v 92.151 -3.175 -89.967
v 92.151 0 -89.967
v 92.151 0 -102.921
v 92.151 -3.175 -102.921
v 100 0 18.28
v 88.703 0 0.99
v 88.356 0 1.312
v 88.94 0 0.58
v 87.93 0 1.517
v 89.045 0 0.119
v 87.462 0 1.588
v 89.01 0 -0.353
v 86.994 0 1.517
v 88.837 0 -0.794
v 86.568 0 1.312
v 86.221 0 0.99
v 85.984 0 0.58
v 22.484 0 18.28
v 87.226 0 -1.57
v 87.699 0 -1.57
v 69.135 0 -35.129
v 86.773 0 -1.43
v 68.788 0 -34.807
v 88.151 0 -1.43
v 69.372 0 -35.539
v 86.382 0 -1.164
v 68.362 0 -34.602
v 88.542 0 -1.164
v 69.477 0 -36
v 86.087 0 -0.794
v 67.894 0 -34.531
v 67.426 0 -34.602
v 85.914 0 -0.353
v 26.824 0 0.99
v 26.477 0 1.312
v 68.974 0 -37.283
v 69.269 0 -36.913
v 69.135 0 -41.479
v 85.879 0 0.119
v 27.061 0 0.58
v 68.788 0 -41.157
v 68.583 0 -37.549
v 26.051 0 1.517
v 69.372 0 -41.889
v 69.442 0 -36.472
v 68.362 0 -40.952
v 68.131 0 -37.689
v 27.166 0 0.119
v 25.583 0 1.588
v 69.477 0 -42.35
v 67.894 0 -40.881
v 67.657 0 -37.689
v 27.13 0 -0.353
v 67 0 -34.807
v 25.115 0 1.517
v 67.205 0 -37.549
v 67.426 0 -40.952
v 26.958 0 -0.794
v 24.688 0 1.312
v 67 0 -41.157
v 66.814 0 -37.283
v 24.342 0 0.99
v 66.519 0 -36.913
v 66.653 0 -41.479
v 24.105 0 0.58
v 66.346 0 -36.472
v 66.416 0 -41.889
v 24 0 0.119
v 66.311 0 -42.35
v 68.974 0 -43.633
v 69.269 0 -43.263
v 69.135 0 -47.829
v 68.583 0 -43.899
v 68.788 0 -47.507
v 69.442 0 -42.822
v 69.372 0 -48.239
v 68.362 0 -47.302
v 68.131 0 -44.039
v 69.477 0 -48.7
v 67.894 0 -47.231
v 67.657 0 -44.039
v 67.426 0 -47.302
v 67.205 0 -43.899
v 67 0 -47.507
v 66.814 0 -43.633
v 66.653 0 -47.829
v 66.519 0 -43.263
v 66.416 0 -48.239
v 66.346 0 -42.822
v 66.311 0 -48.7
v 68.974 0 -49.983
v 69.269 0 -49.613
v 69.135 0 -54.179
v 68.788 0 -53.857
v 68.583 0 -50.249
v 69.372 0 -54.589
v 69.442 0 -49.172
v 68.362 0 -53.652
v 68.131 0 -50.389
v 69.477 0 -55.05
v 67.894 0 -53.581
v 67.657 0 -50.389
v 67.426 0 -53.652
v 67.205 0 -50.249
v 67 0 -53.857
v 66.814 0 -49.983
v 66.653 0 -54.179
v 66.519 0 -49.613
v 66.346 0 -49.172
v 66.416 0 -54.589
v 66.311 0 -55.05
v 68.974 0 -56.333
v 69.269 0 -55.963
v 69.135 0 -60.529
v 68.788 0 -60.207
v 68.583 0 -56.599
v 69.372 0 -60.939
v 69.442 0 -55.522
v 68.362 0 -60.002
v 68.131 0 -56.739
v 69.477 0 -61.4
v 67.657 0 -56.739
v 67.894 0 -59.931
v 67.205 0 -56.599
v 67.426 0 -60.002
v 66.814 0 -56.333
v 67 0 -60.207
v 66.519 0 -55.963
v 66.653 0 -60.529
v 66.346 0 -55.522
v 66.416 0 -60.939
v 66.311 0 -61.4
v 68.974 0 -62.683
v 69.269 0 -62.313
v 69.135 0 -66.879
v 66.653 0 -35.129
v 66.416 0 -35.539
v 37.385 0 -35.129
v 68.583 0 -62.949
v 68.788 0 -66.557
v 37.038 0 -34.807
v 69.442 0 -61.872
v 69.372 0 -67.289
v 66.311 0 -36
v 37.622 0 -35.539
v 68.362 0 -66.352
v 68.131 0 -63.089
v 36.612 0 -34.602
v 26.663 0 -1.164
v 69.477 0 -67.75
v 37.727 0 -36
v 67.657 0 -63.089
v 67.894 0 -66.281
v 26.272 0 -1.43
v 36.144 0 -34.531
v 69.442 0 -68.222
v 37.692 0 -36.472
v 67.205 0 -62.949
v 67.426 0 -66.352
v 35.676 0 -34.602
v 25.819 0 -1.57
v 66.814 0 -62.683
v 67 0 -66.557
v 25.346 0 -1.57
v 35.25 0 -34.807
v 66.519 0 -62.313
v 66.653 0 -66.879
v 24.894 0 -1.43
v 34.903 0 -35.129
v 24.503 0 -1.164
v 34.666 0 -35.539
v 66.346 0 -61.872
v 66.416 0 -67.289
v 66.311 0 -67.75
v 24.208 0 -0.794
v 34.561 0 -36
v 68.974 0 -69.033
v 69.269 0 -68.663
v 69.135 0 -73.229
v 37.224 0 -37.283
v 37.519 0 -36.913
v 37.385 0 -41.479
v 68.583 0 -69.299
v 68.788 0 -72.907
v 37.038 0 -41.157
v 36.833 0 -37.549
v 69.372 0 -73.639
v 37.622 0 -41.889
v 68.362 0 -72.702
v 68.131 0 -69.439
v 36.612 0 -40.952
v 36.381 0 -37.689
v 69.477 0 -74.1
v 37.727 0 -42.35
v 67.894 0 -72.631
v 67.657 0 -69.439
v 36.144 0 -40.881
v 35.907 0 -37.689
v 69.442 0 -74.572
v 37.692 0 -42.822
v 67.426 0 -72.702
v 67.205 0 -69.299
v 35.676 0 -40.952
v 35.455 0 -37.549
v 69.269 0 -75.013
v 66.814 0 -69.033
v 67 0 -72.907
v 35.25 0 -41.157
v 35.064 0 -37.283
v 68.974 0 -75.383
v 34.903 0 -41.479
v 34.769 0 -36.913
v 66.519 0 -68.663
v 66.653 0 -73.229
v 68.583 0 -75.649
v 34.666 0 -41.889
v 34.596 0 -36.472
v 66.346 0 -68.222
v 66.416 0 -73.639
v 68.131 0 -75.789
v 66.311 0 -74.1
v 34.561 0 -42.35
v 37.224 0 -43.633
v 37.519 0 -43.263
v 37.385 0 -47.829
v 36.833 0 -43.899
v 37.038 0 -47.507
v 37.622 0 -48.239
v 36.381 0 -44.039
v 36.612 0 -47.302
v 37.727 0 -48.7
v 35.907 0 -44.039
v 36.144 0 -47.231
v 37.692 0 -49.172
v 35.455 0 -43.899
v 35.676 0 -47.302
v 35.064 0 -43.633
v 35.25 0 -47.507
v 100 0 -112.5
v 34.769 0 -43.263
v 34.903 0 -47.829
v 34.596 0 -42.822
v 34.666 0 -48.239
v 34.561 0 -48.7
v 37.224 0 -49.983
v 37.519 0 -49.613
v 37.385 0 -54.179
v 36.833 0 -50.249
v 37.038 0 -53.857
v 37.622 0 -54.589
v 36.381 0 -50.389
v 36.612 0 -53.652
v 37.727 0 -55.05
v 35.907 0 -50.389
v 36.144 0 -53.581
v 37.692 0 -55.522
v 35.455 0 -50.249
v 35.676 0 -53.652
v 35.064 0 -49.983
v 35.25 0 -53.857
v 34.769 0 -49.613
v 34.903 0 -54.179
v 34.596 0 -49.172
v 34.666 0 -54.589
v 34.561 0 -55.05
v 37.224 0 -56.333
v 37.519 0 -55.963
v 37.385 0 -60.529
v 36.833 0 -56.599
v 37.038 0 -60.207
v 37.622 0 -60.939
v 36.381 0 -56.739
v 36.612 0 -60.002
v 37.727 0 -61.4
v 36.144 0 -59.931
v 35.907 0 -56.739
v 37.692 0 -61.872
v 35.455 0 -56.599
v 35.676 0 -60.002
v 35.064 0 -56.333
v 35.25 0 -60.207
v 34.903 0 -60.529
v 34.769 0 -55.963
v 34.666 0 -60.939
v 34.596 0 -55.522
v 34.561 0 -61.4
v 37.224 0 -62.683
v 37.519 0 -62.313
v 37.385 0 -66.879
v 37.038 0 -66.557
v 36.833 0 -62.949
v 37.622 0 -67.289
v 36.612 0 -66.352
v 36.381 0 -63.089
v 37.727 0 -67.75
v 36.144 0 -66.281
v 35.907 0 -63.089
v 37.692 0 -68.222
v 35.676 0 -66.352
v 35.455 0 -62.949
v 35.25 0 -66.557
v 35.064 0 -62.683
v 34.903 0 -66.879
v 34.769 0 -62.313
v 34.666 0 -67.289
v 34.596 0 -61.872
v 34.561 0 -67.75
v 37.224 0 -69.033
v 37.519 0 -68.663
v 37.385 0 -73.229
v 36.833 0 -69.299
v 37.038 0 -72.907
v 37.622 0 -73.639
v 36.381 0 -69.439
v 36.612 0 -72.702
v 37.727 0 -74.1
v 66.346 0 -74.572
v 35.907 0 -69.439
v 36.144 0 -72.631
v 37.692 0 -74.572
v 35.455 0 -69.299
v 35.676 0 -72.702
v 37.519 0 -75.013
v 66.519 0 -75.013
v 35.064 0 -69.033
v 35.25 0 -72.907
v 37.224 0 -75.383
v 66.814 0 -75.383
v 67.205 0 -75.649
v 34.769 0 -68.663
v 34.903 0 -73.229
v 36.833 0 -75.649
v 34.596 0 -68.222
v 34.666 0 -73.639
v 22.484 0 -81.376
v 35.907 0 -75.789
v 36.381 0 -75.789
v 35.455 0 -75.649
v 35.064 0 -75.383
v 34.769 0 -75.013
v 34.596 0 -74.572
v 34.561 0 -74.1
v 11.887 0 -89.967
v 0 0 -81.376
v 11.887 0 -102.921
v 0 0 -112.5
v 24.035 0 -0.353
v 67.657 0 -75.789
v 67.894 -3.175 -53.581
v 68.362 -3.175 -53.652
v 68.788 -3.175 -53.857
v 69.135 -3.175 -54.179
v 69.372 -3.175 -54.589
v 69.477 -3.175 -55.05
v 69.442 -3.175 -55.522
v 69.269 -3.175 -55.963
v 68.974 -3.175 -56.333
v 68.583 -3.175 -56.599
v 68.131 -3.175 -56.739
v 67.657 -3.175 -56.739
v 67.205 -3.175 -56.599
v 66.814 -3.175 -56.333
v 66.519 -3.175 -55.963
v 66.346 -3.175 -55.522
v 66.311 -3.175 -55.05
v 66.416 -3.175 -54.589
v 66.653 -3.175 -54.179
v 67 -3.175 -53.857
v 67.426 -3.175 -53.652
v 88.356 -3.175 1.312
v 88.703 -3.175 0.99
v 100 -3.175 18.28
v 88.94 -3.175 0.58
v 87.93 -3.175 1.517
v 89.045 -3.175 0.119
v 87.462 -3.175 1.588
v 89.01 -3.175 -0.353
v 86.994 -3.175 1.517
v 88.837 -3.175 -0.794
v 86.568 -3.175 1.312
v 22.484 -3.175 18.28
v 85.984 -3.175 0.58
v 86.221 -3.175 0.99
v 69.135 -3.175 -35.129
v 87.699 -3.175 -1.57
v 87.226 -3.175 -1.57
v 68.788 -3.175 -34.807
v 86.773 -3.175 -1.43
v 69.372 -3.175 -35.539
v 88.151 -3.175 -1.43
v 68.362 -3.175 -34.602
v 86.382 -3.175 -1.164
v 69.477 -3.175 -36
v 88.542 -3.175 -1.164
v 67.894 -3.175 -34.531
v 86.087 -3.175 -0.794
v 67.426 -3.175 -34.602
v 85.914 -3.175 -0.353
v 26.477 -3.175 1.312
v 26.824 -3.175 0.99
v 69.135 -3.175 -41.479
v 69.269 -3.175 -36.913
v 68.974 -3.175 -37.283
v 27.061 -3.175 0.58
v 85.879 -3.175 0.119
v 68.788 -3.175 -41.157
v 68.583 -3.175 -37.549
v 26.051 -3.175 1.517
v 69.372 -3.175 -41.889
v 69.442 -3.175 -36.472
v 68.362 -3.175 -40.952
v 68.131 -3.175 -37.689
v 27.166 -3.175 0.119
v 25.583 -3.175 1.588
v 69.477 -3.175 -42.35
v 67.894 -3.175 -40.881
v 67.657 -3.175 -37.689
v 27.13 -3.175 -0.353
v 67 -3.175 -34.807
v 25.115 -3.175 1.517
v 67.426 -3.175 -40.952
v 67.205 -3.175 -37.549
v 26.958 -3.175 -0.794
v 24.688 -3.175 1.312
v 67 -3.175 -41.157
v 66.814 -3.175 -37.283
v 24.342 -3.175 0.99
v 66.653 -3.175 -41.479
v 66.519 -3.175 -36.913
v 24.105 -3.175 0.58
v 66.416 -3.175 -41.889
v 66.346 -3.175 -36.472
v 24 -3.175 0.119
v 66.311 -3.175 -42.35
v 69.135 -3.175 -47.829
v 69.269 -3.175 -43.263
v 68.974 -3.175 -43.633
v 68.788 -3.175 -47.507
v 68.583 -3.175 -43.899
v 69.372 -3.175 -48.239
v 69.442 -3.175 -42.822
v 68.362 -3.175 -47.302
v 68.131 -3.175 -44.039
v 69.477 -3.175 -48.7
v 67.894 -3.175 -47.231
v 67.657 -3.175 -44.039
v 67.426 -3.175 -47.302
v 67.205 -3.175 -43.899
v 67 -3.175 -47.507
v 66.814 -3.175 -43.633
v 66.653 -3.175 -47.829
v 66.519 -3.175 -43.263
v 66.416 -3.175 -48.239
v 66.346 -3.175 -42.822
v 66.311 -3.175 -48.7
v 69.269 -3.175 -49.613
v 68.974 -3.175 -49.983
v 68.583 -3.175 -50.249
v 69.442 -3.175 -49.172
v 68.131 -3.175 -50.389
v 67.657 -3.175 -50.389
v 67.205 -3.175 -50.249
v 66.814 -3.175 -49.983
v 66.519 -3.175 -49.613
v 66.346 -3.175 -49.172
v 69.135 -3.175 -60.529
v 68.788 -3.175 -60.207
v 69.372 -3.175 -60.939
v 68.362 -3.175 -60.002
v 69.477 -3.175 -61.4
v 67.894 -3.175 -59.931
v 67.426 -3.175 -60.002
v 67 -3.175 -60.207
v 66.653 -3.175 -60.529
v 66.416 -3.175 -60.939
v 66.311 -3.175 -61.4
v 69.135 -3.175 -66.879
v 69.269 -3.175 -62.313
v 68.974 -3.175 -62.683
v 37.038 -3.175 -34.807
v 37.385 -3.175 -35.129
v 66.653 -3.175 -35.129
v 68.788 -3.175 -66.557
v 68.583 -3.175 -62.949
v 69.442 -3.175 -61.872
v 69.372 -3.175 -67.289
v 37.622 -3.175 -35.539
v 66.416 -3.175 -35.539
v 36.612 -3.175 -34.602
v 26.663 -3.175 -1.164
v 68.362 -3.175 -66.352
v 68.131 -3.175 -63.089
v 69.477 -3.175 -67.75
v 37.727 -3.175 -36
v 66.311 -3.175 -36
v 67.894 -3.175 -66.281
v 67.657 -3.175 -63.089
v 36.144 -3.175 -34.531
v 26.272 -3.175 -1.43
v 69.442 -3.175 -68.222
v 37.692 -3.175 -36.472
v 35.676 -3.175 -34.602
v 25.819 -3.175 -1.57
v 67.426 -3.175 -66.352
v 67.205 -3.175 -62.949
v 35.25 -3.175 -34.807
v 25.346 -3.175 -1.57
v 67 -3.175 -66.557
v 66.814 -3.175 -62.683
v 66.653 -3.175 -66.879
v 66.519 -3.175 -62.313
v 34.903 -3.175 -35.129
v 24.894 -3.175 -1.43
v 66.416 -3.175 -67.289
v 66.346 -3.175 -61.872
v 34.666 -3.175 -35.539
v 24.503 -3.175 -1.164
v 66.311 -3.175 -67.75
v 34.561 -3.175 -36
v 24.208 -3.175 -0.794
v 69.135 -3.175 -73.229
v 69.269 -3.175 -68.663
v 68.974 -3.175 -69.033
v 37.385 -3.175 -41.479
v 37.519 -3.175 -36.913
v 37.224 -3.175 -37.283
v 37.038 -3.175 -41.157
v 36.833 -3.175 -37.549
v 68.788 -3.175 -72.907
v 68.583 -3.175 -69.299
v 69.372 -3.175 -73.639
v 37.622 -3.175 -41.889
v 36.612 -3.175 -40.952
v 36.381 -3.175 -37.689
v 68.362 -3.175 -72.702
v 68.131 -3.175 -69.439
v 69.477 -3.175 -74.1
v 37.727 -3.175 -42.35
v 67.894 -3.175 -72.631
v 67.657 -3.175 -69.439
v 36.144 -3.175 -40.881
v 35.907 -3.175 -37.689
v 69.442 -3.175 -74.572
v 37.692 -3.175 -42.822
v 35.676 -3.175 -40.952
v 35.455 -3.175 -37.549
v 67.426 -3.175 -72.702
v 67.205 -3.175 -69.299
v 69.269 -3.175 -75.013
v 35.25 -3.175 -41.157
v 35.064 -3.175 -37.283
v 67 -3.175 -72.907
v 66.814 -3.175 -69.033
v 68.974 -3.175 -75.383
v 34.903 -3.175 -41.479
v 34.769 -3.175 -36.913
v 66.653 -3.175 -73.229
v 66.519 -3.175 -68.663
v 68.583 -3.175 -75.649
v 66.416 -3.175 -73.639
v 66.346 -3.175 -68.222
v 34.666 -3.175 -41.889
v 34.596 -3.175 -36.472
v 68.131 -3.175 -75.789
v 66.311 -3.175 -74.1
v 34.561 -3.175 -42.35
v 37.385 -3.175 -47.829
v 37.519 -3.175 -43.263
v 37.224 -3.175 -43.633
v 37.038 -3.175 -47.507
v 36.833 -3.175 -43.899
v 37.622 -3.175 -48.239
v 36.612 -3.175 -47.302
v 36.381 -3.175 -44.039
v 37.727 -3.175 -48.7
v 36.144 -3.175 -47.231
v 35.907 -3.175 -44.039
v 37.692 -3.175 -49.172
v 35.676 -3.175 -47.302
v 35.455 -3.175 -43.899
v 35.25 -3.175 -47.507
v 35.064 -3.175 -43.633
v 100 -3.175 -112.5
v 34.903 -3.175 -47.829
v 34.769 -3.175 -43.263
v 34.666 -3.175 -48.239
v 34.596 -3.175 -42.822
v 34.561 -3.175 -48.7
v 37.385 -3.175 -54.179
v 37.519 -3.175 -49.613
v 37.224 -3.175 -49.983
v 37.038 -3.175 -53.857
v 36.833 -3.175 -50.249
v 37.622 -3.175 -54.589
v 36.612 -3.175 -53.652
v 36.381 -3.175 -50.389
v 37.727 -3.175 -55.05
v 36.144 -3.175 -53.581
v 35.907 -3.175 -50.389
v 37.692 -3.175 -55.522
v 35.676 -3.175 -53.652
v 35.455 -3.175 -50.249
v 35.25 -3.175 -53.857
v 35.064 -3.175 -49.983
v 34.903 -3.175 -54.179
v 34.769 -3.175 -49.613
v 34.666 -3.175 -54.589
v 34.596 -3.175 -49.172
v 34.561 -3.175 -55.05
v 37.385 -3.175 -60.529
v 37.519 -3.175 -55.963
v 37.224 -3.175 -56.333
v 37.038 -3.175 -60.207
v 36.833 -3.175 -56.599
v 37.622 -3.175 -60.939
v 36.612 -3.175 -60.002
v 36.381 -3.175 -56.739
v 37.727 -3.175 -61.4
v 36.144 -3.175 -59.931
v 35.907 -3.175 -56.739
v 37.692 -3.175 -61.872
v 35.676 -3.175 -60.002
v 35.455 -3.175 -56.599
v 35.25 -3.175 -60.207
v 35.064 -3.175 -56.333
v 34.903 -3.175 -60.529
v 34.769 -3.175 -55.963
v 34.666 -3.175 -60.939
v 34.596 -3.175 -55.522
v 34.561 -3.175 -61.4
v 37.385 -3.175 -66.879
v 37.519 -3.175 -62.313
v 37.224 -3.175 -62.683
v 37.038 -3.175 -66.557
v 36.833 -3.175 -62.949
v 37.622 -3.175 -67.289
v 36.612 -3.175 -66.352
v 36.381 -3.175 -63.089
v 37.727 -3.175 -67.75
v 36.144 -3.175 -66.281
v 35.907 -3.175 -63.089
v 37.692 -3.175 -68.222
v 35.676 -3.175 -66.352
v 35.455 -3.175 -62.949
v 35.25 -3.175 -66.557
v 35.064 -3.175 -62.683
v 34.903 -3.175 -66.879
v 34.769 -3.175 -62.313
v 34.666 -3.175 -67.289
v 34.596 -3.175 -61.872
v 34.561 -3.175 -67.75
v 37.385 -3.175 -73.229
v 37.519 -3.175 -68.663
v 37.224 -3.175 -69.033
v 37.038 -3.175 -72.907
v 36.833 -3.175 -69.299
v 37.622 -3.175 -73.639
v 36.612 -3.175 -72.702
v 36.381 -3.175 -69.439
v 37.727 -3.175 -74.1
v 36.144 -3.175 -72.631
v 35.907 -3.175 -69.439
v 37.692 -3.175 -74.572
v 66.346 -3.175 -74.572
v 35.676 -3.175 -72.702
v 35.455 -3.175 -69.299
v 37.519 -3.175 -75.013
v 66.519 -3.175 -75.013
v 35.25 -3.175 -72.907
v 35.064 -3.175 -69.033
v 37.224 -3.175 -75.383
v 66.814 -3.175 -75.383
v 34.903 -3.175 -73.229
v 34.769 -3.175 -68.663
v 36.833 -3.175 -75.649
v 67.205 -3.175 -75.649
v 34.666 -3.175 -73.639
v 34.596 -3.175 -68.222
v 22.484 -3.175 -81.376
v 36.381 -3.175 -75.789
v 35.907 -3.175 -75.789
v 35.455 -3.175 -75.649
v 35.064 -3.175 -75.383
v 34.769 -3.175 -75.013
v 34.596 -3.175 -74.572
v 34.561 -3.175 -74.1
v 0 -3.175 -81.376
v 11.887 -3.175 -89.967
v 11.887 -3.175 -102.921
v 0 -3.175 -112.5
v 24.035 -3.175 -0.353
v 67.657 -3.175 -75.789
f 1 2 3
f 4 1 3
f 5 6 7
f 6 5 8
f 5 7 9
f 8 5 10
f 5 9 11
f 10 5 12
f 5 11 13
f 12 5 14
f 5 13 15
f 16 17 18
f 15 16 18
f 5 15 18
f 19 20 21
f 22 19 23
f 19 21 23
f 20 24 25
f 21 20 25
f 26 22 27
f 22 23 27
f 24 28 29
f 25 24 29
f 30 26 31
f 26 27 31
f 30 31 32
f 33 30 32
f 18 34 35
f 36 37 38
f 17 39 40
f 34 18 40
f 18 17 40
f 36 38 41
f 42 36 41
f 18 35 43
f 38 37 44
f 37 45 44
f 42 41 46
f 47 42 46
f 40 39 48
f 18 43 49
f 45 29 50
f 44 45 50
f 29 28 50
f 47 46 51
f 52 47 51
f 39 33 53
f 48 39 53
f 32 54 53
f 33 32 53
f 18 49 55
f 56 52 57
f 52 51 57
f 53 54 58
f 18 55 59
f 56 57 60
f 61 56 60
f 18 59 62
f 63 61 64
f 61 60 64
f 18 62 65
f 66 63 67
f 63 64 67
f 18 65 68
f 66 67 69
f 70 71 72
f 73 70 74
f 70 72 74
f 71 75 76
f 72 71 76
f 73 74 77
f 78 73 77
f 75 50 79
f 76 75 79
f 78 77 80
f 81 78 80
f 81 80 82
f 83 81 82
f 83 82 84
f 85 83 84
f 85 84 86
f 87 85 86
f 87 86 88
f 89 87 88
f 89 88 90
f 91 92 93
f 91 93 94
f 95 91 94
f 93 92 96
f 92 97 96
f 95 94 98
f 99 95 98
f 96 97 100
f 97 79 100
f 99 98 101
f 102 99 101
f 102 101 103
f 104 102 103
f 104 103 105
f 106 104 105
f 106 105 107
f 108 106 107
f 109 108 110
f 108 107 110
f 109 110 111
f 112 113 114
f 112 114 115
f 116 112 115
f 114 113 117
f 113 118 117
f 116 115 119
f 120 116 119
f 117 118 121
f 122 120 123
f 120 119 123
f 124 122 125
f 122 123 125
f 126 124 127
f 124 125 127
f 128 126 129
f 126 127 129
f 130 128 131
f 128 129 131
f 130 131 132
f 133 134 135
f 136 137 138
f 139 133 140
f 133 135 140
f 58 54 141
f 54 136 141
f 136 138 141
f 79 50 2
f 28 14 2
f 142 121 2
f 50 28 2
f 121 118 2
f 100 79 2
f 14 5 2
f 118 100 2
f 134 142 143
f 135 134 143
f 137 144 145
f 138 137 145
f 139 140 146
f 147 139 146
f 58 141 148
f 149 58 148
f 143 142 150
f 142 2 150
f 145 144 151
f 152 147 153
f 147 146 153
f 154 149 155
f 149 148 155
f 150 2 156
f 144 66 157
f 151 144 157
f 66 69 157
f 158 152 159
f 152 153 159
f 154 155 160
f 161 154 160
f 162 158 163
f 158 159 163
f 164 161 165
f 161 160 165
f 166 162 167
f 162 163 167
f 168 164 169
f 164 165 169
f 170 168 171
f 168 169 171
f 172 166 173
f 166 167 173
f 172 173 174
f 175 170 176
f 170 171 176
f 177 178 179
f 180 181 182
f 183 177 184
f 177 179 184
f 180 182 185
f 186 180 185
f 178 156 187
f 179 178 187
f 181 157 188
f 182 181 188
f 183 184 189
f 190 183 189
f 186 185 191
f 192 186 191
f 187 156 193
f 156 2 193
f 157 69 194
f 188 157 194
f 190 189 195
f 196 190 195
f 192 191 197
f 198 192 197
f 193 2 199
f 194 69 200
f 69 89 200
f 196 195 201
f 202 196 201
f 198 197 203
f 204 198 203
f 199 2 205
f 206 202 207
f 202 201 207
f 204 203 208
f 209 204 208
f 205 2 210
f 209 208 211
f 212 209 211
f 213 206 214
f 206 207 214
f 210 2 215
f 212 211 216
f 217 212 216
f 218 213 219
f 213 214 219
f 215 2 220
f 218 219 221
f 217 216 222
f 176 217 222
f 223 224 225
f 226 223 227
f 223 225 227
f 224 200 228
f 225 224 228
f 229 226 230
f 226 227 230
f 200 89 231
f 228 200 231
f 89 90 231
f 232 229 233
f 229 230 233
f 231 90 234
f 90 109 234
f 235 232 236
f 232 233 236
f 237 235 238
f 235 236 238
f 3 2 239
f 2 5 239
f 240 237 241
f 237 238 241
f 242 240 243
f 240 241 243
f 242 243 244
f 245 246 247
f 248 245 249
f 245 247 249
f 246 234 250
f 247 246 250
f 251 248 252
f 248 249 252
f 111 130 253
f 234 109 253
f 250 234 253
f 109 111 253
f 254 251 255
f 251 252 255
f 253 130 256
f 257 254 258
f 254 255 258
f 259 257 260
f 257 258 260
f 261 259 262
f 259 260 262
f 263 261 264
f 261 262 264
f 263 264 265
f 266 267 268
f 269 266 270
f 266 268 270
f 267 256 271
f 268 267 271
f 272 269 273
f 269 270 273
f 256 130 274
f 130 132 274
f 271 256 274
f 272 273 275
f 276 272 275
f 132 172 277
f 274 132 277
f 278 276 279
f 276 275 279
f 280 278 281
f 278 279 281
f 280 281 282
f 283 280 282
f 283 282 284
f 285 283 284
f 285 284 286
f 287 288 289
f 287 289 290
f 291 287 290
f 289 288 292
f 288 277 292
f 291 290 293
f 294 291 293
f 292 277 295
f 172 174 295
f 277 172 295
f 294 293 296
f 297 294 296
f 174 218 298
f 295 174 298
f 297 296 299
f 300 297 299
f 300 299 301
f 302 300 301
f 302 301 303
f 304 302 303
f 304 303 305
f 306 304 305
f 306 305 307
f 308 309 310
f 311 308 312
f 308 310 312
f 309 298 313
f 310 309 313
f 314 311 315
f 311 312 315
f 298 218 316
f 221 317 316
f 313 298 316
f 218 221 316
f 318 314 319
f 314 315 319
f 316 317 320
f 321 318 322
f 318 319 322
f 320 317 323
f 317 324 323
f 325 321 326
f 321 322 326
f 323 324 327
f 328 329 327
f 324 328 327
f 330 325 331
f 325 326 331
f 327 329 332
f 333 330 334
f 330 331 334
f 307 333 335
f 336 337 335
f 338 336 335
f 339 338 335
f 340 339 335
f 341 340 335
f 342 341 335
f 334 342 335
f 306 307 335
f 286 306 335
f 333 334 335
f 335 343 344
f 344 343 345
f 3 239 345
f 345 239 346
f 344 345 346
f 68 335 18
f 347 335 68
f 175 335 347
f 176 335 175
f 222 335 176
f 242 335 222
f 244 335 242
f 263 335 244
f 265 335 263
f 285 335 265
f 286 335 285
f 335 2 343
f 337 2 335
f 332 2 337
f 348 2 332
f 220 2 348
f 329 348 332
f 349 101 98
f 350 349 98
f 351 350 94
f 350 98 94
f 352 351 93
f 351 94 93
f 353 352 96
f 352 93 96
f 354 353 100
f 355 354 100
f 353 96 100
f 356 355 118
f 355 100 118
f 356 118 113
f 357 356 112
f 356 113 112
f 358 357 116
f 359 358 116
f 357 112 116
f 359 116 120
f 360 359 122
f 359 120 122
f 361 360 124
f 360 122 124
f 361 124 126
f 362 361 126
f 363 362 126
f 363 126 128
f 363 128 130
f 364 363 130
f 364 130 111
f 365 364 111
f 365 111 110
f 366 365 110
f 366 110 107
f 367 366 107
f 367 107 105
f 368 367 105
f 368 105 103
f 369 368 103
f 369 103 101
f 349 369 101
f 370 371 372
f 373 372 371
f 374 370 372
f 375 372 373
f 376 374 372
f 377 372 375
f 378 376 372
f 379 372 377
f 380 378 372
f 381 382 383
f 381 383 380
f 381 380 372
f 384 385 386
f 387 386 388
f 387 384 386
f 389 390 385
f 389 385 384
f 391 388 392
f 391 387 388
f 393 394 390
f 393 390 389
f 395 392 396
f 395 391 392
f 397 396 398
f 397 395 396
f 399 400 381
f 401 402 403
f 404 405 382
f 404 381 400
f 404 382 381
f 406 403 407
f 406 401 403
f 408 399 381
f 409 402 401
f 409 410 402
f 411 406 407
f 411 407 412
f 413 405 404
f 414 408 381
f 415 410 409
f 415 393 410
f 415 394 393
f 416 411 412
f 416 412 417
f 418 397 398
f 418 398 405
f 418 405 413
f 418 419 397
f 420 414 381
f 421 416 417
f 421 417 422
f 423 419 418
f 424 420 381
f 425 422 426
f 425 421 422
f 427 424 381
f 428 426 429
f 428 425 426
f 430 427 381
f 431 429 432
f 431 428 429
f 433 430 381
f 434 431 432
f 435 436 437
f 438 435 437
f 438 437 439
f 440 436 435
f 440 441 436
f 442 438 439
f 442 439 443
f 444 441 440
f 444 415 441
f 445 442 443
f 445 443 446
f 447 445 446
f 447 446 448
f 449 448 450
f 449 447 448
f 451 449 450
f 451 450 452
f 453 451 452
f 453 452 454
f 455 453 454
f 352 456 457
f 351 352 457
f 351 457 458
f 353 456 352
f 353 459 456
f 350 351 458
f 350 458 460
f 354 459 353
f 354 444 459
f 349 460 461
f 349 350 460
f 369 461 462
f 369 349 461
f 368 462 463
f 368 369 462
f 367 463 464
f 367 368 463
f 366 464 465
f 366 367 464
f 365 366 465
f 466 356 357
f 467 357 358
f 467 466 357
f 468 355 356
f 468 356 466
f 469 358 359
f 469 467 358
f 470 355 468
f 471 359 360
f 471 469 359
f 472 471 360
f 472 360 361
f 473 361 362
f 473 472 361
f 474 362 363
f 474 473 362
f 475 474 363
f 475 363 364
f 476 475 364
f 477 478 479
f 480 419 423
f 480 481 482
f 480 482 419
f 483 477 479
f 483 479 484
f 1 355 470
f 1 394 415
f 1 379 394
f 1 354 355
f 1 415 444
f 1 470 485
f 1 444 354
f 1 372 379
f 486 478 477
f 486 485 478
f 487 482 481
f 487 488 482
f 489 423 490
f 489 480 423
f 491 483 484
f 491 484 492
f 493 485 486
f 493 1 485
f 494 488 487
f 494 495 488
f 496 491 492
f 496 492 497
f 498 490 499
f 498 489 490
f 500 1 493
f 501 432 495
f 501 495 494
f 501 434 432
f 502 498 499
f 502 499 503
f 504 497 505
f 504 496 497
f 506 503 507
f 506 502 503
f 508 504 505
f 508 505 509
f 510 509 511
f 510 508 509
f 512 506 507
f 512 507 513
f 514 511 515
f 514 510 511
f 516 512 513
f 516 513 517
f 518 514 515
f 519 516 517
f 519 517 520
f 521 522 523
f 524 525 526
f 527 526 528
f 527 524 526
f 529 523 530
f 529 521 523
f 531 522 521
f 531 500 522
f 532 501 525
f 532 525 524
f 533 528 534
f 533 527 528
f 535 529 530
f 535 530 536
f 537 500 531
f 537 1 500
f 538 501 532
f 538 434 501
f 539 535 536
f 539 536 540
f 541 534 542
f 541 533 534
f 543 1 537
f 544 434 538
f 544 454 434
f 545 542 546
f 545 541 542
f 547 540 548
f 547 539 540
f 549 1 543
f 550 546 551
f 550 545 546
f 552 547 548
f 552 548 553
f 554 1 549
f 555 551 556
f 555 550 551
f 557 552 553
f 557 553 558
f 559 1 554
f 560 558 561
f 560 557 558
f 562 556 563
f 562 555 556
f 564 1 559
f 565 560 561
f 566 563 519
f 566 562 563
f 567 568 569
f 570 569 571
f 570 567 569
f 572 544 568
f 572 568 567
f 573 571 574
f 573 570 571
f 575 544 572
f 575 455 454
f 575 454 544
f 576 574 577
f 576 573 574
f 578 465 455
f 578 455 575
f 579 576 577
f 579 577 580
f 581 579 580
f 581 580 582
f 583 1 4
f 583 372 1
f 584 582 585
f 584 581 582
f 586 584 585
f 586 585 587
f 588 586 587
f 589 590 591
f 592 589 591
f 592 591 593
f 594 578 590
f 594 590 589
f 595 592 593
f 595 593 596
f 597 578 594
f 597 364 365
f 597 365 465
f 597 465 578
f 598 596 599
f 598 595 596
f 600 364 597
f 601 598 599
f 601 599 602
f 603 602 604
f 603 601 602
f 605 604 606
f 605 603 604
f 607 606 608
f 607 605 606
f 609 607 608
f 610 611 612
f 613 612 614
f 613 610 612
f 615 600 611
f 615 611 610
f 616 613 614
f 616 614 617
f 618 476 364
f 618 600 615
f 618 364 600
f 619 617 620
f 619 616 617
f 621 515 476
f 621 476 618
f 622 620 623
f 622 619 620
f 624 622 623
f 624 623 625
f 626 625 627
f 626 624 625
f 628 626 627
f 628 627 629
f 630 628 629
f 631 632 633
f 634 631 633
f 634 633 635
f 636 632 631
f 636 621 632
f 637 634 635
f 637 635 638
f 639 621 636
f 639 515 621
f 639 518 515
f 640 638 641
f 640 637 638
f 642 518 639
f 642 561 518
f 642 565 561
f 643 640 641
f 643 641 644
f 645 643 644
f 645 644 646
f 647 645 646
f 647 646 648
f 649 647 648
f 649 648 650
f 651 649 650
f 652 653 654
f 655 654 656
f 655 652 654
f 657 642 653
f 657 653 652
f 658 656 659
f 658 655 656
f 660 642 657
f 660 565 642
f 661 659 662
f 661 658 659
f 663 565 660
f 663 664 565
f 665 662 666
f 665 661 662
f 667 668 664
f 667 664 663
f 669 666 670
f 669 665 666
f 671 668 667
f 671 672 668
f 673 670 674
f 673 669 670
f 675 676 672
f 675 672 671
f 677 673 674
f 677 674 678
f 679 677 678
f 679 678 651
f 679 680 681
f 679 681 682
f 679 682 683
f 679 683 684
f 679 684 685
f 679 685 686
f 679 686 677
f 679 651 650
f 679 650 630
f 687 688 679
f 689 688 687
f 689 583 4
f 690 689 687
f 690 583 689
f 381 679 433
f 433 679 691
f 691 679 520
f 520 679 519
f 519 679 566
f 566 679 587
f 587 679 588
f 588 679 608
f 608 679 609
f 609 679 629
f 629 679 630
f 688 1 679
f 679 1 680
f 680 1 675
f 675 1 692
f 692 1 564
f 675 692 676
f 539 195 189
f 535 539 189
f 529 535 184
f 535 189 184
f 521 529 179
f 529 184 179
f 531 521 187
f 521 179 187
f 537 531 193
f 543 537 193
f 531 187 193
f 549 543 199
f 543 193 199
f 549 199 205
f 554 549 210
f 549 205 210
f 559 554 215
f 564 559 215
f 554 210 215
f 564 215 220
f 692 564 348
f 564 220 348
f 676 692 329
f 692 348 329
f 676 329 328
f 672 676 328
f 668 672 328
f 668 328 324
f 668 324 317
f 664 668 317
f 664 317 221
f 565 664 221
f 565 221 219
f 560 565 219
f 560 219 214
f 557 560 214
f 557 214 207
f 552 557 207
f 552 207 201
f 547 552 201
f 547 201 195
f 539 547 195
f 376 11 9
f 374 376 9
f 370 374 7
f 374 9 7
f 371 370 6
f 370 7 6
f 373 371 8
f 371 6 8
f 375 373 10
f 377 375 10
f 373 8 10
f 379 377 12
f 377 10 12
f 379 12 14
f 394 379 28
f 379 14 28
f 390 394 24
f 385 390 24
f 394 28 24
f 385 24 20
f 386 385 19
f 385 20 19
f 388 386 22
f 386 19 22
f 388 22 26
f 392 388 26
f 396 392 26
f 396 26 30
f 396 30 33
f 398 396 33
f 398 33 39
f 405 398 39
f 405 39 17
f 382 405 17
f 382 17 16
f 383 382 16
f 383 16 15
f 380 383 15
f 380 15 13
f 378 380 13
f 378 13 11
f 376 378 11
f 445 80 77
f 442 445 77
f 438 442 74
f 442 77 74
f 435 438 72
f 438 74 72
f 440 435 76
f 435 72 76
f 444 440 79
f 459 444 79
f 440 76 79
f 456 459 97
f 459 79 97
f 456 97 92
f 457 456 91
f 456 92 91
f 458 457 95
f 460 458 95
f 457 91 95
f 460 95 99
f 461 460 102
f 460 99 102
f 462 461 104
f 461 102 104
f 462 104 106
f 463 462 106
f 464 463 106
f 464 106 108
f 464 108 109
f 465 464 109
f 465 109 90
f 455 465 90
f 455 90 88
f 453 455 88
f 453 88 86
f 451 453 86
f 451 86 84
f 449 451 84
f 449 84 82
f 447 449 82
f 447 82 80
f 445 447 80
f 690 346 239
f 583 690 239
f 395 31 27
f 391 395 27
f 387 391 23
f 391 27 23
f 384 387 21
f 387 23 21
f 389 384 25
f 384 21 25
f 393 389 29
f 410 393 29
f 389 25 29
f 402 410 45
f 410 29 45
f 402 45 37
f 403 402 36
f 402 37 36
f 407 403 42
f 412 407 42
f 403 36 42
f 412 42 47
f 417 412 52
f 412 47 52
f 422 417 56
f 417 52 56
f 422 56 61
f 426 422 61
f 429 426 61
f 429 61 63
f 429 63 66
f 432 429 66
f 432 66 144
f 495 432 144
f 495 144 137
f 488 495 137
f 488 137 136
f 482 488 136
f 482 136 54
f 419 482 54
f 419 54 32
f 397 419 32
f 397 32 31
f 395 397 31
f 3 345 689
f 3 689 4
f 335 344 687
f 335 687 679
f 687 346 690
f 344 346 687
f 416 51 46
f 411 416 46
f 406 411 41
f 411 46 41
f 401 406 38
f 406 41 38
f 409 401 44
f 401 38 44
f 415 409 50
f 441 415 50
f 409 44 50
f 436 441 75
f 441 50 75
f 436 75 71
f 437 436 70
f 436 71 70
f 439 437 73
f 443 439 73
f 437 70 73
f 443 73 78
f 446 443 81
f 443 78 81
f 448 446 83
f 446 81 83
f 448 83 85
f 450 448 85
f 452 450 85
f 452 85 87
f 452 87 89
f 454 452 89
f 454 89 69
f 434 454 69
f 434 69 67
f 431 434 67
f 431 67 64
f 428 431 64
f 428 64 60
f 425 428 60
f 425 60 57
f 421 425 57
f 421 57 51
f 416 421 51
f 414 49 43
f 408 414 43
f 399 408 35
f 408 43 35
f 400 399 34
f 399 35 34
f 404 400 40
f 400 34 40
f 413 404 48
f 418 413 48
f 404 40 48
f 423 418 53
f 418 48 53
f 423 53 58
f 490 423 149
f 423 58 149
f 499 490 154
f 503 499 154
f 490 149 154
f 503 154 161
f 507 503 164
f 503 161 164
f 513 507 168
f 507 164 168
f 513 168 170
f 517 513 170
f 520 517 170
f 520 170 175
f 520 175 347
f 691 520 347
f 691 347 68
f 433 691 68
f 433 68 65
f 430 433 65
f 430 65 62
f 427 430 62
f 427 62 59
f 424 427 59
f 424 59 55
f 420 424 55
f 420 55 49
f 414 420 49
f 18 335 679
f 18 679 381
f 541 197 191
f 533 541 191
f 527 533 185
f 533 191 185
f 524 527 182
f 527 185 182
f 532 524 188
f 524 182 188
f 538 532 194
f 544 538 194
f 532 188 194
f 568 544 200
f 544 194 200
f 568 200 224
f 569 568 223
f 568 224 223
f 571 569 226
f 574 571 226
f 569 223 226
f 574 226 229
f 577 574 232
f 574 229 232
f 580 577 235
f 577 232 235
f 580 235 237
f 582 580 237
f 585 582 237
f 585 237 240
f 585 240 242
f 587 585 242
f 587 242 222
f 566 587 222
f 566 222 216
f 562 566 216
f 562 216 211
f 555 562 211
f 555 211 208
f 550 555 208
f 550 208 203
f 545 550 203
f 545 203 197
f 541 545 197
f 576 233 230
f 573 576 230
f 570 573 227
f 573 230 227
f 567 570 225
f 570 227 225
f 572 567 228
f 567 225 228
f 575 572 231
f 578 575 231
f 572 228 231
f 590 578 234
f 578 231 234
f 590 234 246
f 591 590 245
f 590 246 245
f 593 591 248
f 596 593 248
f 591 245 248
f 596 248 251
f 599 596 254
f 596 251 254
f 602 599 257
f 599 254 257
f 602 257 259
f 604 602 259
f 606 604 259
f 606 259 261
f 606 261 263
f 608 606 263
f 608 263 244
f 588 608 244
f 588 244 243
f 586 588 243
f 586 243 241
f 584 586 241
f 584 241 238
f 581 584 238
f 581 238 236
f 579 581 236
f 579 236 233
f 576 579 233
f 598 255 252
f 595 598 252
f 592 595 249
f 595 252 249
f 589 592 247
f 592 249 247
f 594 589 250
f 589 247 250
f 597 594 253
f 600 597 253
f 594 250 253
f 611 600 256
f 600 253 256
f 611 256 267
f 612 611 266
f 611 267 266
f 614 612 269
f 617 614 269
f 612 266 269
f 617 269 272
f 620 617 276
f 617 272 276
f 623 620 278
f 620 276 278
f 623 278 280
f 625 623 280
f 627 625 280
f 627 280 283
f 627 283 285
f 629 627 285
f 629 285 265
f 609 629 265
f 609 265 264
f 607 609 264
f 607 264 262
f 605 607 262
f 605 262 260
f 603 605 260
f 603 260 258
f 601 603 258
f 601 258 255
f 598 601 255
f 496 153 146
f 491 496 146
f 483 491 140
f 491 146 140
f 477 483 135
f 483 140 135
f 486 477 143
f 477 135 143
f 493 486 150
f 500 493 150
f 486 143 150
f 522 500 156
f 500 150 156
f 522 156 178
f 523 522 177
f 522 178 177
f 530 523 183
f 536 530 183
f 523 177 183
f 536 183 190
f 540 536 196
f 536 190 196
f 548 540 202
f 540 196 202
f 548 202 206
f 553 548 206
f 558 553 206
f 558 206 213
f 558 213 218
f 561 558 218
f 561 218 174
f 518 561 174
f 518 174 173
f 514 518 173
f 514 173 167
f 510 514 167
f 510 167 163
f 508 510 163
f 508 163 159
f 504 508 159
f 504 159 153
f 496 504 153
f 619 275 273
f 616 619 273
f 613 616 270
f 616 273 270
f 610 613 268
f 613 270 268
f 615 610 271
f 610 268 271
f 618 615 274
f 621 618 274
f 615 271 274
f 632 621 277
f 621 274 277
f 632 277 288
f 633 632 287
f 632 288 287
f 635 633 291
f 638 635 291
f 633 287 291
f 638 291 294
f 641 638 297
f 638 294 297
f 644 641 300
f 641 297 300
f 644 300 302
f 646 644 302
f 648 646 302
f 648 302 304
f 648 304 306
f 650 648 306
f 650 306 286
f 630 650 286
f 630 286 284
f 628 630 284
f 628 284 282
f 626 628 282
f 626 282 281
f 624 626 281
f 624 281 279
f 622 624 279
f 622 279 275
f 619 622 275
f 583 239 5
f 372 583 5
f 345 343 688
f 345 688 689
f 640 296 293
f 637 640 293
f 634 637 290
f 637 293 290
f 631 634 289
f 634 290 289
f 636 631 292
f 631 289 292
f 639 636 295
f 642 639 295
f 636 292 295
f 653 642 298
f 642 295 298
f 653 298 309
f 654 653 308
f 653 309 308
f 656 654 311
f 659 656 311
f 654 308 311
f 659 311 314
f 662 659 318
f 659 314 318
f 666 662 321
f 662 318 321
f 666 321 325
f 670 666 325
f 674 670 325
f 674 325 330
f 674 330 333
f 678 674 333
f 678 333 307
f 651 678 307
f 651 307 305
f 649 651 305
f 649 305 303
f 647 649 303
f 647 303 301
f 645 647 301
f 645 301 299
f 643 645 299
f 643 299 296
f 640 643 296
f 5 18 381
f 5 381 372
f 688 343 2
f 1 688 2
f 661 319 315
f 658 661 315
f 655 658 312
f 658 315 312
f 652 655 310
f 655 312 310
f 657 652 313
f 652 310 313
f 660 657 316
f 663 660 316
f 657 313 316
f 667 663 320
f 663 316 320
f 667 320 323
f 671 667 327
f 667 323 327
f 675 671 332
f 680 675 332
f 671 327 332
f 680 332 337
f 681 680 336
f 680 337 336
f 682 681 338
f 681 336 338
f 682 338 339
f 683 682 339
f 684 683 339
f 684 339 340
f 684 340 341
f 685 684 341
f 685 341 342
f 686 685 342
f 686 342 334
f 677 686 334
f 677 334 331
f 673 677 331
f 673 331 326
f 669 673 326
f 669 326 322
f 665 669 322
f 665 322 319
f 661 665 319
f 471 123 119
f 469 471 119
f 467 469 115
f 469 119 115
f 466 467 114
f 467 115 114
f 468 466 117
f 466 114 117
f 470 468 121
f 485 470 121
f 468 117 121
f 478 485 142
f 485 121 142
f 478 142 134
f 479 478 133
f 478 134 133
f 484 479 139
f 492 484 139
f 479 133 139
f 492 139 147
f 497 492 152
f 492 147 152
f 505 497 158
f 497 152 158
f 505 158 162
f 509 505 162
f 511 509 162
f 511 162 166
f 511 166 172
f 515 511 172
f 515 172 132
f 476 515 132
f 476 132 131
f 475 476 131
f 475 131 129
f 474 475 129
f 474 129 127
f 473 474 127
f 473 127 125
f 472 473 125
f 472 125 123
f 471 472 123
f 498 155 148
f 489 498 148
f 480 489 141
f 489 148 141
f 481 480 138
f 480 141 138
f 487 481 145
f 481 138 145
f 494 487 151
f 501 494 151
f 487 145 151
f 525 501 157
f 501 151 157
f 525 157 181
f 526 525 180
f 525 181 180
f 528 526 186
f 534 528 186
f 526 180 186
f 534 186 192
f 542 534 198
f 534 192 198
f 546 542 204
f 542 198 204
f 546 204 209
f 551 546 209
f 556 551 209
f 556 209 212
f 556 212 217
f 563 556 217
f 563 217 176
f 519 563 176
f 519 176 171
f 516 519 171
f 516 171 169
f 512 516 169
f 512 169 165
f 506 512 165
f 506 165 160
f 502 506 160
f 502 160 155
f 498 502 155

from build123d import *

# Parameters (mm, degrees)
BOSS_EXTRUDE1_DEPTH = 3.175
SKETCH2_R           = 1.5875
SKETCH2_W           = 80.264
SKETCH2_H           = 12.954
CUT_EXTRUDE1_DEPTH  = 223.985606318
SKETCH7_R           = 1.5875
SKETCH7_W           = 46.99
SKETCH7_H           = 138.43
CUT_EXTRUDE4_DEPTH  = 223.985606318
CUT_EXTRUDE5_DEPTH  = 223.985606318
CUT_EXTRUDE8_DEPTH  = 221.482742149
SKETCH10_W          = 220.910927054
SKETCH10_H          = 122.260722121
CUT_EXTRUDE9_DEPTH  = 151.553414525


with BuildPart() as part:
    # Sketch1 → Boss-Extrude1 (new body)
    with BuildSketch(Plane(origin=(0, 0, 0), x_dir=(1, 0, 0), z_dir=(0, 1, 0))):
        with BuildLine():
            Line((-80, 112.5), (100, 112.5))
            Line((100, 112.5), (100, -112.5))
            Line((100, -112.5), (-80, -112.5))
            ThreePointArc((-80, -112.5), (-192.5, 0), (-80, 112.5))
        make_face()
    extrude(amount=-BOSS_EXTRUDE1_DEPTH)

    # Sketch2 → Cut-Extrude1 (cut, through all)
    with BuildSketch(Plane(origin=(0, 0, 0), x_dir=(1, 0, 0), z_dir=(0, 1, 0))):
        with Locations(Location((36.144045702, -74.2188, 0), (0, 0, 270))):
            Circle(SKETCH2_R)
        with Locations(Location((36.144045702, -67.8688, 0), (0, 0, 270))):
            Circle(SKETCH2_R)
        with Locations(Location((36.144045702, -61.5188, 0), (0, 0, 270))):
            Circle(SKETCH2_R)
        with Locations(Location((36.144045702, -55.1688, 0), (0, 0, 270))):
            Circle(SKETCH2_R)
        with Locations(Location((36.144045702, -48.8188, 0), (0, 0, 270))):
            Circle(SKETCH2_R)
        with Locations(Location((36.144045702, -42.4688, 0), (0, 0, 270))):
            Circle(SKETCH2_R)
        with Locations(Location((36.144045702, -36.1188, 0), (0, 0, 270))):
            Circle(SKETCH2_R)
        with Locations(Location((67.894045702, -74.2188, 0), (0, 0, 270))):
            Circle(SKETCH2_R)
        with Locations(Location((67.894045702, -67.8688, 0), (0, 0, 270))):
            Circle(SKETCH2_R)
        with Locations(Location((67.894045702, -61.5188, 0), (0, 0, 270))):
            Circle(SKETCH2_R)
        with Locations(Location((67.894045702, -55.1688, 0), (0, 0, 270))):
            Circle(SKETCH2_R)
        with Locations(Location((67.894045702, -48.8188, 0), (0, 0, 270))):
            Circle(SKETCH2_R)
        with Locations(Location((67.894045702, -42.4688, 0), (0, 0, 270))):
            Circle(SKETCH2_R)
        with Locations(Location((67.894045702, -36.1188, 0), (0, 0, 270))):
            Circle(SKETCH2_R)
        with Locations(Location((36.144045702, 74.2188, 0), (0, 0, 270))):
            Circle(SKETCH2_R)
        with Locations(Location((36.144045702, 67.8688, 0), (0, 0, 270))):
            Circle(SKETCH2_R)
        with Locations(Location((36.144045702, 61.5188, 0), (0, 0, 270))):
            Circle(SKETCH2_R)
        with Locations(Location((36.144045702, 55.1688, 0), (0, 0, 270))):
            Circle(SKETCH2_R)
        with Locations(Location((36.144045702, 48.8188, 0), (0, 0, 270))):
            Circle(SKETCH2_R)
        with Locations(Location((36.144045702, 42.4688, 0), (0, 0, 270))):
            Circle(SKETCH2_R)
        with Locations(Location((36.144045702, 36.1188, 0), (0, 0, 270))):
            Circle(SKETCH2_R)
        with Locations(Location((67.894045702, 74.2188, 0), (0, 0, 270))):
            Circle(SKETCH2_R)
        with Locations(Location((67.894045702, 67.8688, 0), (0, 0, 270))):
            Circle(SKETCH2_R)
        with Locations(Location((67.894045702, 61.5188, 0), (0, 0, 270))):
            Circle(SKETCH2_R)
        with Locations(Location((67.894045702, 55.1688, 0), (0, 0, 270))):
            Circle(SKETCH2_R)
        with Locations(Location((67.894045702, 48.8188, 0), (0, 0, 270))):
            Circle(SKETCH2_R)
        with Locations(Location((67.894045702, 42.4688, 0), (0, 0, 270))):
            Circle(SKETCH2_R)
        with Locations(Location((67.894045702, 36.1188, 0), (0, 0, 270))):
            Circle(SKETCH2_R)
        with Locations((52.019045702, -96.4438)):
            Rectangle(SKETCH2_W, SKETCH2_H)
        with Locations((52.019045702, 96.4438)):
            Rectangle(SKETCH2_W, SKETCH2_H)
    extrude(amount=-CUT_EXTRUDE1_DEPTH, mode=Mode.SUBTRACT)

    # Sketch7 → Cut-Extrude4 (cut, through all)
    with BuildSketch(Plane(origin=(0, 0, 0), x_dir=(1, 0, 0), z_dir=(0, 1, 0))):
        with Locations(Location((-50.166143469, 0, 0), (0, 0, 270))):
            Circle(SKETCH7_R)
        with Locations(Location((25.582761582, 0, 0), (0, 0, 270))):
            Circle(SKETCH7_R)
        with Locations(Location((87.462148806, 0, 0), (0, 0, 270))):
            Circle(SKETCH7_R)
        with Locations((-13.971143469, 0)):
            Rectangle(SKETCH7_W, SKETCH7_H)
    extrude(amount=-CUT_EXTRUDE4_DEPTH, mode=Mode.SUBTRACT)

    # Sketch8 → Cut-Extrude5 (cut, through all)
    with BuildSketch(Plane(origin=(0, 0, 0), x_dir=(1, 0, 0), z_dir=(0, 1, 0))):
        with BuildLine():
            Line((-167.0966, 25.4), (-229.776686608, 25.4))
            Line((-229.776686608, 25.4), (-229.776686608, -25.4))
            Line((-229.776686608, -25.4), (-167.0966, -25.4))
            ThreePointArc((-167.0966, -25.4), (-141.6966, 0), (-167.0966, 25.4))
        make_face()
    extrude(amount=-CUT_EXTRUDE5_DEPTH, mode=Mode.SUBTRACT)

    # Sketch9 → Cut-Extrude8 (cut, through all)
    with BuildSketch(Plane(origin=(0, 0, 0), x_dir=(1, 0, 0), z_dir=(0, 1, 0))):
        Polygon((-202.496068311, 81.375621875), (-202.496068311, 118.60629855), (0, 118.60629855), (0, 81.375621875), (22.483592167, 81.375621875), (22.483592167, -78.716287827), (0, -78.716287827), (0, -122.329366217), (-202.496068311, -122.329366217), (-202.496068311, -78.716287827), align=None)
    extrude(amount=-CUT_EXTRUDE8_DEPTH, mode=Mode.SUBTRACT)

    # Sketch10 → Cut-Extrude9 (cut, through all)
    with BuildSketch(Plane(origin=(0, 0, 0), x_dir=(1, 0, 0), z_dir=(0, 1, 0))):
        with Locations((38.526909819, -79.409861337)):
            Rectangle(SKETCH10_W, SKETCH10_H)
    extrude(amount=-CUT_EXTRUDE9_DEPTH, mode=Mode.SUBTRACT)


solid = part.part
